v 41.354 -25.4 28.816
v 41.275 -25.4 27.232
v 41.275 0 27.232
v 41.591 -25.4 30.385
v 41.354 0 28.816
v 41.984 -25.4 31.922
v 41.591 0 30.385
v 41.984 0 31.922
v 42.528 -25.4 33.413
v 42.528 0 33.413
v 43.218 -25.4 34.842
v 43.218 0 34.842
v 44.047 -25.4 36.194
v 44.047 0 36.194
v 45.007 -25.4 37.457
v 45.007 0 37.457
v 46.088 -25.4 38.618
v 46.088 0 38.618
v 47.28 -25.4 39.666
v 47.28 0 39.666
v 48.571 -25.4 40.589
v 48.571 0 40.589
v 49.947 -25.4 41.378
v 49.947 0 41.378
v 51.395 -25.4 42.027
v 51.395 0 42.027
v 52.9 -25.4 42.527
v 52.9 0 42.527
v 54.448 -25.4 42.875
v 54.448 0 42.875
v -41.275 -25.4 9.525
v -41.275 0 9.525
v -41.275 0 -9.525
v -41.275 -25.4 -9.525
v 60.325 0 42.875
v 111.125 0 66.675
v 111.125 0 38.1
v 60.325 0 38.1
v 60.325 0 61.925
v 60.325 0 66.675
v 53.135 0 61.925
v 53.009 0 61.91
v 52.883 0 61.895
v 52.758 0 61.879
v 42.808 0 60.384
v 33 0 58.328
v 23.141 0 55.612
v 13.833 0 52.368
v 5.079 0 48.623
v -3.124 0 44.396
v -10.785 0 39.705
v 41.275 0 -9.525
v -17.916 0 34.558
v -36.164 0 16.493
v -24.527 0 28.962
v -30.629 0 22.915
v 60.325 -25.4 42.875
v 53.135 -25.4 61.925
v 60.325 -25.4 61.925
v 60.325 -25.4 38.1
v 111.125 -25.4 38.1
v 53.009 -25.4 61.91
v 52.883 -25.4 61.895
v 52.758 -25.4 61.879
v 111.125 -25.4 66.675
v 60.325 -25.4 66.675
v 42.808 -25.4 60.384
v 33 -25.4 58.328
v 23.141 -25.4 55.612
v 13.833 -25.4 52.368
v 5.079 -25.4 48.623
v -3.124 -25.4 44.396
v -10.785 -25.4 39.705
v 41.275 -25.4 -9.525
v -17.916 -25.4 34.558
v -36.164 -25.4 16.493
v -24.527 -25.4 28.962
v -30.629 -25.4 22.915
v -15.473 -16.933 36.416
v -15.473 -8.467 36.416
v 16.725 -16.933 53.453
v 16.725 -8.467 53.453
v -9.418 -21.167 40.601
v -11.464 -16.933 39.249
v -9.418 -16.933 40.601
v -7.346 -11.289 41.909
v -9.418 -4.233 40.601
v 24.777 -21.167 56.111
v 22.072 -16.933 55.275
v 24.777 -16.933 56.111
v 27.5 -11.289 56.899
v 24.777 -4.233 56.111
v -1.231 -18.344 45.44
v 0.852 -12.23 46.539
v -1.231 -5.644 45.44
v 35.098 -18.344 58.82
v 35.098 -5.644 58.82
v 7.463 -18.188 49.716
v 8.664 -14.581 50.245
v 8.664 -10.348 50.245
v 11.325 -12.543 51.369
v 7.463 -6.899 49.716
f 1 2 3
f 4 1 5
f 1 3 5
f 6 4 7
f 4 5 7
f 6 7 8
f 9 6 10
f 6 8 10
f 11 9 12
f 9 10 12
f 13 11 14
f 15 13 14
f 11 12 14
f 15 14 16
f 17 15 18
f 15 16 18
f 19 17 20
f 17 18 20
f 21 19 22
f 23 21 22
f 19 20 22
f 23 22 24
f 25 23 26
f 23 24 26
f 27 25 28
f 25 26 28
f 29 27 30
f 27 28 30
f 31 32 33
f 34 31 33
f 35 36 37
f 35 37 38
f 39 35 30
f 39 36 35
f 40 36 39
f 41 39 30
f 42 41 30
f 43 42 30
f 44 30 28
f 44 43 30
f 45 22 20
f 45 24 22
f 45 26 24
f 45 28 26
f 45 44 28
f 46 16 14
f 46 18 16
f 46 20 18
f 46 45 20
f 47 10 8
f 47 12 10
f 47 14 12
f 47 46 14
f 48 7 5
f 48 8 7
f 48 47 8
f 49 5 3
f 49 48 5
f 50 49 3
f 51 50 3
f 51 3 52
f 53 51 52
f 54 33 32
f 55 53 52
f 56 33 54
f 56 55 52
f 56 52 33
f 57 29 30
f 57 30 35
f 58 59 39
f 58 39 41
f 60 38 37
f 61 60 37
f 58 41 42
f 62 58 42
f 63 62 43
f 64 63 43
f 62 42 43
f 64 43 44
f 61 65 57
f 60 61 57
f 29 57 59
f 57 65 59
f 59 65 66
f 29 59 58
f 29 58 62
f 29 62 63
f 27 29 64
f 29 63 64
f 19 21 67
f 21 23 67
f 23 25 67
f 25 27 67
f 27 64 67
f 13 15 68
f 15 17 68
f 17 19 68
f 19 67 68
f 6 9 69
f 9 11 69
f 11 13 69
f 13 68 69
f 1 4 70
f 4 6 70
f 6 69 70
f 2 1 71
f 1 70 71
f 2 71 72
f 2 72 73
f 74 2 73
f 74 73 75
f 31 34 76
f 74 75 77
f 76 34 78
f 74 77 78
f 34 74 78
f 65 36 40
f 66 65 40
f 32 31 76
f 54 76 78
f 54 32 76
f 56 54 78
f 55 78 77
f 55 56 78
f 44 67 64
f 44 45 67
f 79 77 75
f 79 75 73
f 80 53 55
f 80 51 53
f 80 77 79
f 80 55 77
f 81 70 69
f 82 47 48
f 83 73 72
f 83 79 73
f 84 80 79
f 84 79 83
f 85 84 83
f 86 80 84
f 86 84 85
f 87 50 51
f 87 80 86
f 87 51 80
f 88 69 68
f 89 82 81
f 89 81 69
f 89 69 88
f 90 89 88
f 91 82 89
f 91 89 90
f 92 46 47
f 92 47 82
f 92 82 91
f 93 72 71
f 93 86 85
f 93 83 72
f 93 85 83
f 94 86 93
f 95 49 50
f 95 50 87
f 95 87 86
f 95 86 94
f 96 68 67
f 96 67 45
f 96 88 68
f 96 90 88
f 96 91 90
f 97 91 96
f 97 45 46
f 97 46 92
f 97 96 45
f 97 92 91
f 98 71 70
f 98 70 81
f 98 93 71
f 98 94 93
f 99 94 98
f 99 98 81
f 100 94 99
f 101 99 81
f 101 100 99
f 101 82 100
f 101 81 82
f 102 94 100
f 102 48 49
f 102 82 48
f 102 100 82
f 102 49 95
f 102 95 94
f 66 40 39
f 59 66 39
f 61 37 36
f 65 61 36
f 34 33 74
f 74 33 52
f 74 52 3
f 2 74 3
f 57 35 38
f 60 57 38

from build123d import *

# Parameters (mm, degrees)
F1_DEPTH = 25.4


with BuildPart() as f1:
    # F0 (on Front) → F1 (new body)
    with BuildSketch(Plane.XZ):
        with BuildLine():
            add(Edge.make_bspline(
                [(-41.275, 9.525), (-19.526121, 41.756507), (15.662241, 57.34362), (52.757816, 61.879481)],
                knots=[0, 0, 0, 0, 107.612327, 107.612327, 107.612327, 107.612327], degree=3))
            Line((-41.275, 9.525), (22.225, 9.525))
            Line((22.225, 9.525), (22.225, 27.231764))
            ThreePointArc((22.225, 27.231764), (30.947399, 50.322439), (52.757816, 61.879481))
        make_face()
        Polygon((22.225, 9.525), (-41.275, 9.525), (-41.275, -9.525), (41.275, -9.525), (41.275, 9.525), align=None)
        with BuildLine():
            Line((22.225, 27.231764), (22.225, 9.525))
            Line((22.225, 9.525), (41.275, 9.525))
            Line((41.275, 9.525), (41.275, 27.231764))
            ThreePointArc((41.275, 27.231764), (45.007035, 37.457419), (54.448422, 42.8752))
            Line((54.448422, 42.8752), (60.325, 42.8752))
            Line((60.325, 42.8752), (60.325, 61.9252))
            Line((60.325, 61.9252), (53.134891, 61.9252))
            add(Edge.make_bspline(
                [(52.757816, 61.879481), (52.883486, 61.894848), (53.009178, 61.910087), (53.134891, 61.9252)],
                knots=[107.612327, 107.612327, 107.612327, 107.612327, 107.976889, 107.976889, 107.976889, 107.976889], degree=3))
            ThreePointArc((52.757816, 61.879481), (30.947399, 50.322439), (22.225, 27.231764))
        make_face()
        with BuildLine():
            ThreePointArc((53.134891, 61.9252), (52.946292, 61.902853), (52.757816, 61.879481))
            add(Edge.make_bspline(
                [(52.757816, 61.879481), (52.883486, 61.894848), (53.009178, 61.910087), (53.134891, 61.9252)],
                knots=[107.612327, 107.612327, 107.612327, 107.612327, 107.976889, 107.976889, 107.976889, 107.976889], degree=3))
        make_face()
        Polygon((60.325, 66.675), (60.325, 61.9252), (60.325, 42.8752), (85.748771, 42.8752), (85.867248, 66.675), align=None)
        Polygon((85.748771, 42.8752), (60.325, 42.8752), (60.325, 38.1), (85.725, 38.1), align=None)
        Polygon((85.867248, 66.675), (85.748771, 42.8752), (85.725, 38.1), (111.125, 38.1), (111.125, 66.675), align=None)
    extrude(amount=F1_DEPTH)


solid = f1.part
